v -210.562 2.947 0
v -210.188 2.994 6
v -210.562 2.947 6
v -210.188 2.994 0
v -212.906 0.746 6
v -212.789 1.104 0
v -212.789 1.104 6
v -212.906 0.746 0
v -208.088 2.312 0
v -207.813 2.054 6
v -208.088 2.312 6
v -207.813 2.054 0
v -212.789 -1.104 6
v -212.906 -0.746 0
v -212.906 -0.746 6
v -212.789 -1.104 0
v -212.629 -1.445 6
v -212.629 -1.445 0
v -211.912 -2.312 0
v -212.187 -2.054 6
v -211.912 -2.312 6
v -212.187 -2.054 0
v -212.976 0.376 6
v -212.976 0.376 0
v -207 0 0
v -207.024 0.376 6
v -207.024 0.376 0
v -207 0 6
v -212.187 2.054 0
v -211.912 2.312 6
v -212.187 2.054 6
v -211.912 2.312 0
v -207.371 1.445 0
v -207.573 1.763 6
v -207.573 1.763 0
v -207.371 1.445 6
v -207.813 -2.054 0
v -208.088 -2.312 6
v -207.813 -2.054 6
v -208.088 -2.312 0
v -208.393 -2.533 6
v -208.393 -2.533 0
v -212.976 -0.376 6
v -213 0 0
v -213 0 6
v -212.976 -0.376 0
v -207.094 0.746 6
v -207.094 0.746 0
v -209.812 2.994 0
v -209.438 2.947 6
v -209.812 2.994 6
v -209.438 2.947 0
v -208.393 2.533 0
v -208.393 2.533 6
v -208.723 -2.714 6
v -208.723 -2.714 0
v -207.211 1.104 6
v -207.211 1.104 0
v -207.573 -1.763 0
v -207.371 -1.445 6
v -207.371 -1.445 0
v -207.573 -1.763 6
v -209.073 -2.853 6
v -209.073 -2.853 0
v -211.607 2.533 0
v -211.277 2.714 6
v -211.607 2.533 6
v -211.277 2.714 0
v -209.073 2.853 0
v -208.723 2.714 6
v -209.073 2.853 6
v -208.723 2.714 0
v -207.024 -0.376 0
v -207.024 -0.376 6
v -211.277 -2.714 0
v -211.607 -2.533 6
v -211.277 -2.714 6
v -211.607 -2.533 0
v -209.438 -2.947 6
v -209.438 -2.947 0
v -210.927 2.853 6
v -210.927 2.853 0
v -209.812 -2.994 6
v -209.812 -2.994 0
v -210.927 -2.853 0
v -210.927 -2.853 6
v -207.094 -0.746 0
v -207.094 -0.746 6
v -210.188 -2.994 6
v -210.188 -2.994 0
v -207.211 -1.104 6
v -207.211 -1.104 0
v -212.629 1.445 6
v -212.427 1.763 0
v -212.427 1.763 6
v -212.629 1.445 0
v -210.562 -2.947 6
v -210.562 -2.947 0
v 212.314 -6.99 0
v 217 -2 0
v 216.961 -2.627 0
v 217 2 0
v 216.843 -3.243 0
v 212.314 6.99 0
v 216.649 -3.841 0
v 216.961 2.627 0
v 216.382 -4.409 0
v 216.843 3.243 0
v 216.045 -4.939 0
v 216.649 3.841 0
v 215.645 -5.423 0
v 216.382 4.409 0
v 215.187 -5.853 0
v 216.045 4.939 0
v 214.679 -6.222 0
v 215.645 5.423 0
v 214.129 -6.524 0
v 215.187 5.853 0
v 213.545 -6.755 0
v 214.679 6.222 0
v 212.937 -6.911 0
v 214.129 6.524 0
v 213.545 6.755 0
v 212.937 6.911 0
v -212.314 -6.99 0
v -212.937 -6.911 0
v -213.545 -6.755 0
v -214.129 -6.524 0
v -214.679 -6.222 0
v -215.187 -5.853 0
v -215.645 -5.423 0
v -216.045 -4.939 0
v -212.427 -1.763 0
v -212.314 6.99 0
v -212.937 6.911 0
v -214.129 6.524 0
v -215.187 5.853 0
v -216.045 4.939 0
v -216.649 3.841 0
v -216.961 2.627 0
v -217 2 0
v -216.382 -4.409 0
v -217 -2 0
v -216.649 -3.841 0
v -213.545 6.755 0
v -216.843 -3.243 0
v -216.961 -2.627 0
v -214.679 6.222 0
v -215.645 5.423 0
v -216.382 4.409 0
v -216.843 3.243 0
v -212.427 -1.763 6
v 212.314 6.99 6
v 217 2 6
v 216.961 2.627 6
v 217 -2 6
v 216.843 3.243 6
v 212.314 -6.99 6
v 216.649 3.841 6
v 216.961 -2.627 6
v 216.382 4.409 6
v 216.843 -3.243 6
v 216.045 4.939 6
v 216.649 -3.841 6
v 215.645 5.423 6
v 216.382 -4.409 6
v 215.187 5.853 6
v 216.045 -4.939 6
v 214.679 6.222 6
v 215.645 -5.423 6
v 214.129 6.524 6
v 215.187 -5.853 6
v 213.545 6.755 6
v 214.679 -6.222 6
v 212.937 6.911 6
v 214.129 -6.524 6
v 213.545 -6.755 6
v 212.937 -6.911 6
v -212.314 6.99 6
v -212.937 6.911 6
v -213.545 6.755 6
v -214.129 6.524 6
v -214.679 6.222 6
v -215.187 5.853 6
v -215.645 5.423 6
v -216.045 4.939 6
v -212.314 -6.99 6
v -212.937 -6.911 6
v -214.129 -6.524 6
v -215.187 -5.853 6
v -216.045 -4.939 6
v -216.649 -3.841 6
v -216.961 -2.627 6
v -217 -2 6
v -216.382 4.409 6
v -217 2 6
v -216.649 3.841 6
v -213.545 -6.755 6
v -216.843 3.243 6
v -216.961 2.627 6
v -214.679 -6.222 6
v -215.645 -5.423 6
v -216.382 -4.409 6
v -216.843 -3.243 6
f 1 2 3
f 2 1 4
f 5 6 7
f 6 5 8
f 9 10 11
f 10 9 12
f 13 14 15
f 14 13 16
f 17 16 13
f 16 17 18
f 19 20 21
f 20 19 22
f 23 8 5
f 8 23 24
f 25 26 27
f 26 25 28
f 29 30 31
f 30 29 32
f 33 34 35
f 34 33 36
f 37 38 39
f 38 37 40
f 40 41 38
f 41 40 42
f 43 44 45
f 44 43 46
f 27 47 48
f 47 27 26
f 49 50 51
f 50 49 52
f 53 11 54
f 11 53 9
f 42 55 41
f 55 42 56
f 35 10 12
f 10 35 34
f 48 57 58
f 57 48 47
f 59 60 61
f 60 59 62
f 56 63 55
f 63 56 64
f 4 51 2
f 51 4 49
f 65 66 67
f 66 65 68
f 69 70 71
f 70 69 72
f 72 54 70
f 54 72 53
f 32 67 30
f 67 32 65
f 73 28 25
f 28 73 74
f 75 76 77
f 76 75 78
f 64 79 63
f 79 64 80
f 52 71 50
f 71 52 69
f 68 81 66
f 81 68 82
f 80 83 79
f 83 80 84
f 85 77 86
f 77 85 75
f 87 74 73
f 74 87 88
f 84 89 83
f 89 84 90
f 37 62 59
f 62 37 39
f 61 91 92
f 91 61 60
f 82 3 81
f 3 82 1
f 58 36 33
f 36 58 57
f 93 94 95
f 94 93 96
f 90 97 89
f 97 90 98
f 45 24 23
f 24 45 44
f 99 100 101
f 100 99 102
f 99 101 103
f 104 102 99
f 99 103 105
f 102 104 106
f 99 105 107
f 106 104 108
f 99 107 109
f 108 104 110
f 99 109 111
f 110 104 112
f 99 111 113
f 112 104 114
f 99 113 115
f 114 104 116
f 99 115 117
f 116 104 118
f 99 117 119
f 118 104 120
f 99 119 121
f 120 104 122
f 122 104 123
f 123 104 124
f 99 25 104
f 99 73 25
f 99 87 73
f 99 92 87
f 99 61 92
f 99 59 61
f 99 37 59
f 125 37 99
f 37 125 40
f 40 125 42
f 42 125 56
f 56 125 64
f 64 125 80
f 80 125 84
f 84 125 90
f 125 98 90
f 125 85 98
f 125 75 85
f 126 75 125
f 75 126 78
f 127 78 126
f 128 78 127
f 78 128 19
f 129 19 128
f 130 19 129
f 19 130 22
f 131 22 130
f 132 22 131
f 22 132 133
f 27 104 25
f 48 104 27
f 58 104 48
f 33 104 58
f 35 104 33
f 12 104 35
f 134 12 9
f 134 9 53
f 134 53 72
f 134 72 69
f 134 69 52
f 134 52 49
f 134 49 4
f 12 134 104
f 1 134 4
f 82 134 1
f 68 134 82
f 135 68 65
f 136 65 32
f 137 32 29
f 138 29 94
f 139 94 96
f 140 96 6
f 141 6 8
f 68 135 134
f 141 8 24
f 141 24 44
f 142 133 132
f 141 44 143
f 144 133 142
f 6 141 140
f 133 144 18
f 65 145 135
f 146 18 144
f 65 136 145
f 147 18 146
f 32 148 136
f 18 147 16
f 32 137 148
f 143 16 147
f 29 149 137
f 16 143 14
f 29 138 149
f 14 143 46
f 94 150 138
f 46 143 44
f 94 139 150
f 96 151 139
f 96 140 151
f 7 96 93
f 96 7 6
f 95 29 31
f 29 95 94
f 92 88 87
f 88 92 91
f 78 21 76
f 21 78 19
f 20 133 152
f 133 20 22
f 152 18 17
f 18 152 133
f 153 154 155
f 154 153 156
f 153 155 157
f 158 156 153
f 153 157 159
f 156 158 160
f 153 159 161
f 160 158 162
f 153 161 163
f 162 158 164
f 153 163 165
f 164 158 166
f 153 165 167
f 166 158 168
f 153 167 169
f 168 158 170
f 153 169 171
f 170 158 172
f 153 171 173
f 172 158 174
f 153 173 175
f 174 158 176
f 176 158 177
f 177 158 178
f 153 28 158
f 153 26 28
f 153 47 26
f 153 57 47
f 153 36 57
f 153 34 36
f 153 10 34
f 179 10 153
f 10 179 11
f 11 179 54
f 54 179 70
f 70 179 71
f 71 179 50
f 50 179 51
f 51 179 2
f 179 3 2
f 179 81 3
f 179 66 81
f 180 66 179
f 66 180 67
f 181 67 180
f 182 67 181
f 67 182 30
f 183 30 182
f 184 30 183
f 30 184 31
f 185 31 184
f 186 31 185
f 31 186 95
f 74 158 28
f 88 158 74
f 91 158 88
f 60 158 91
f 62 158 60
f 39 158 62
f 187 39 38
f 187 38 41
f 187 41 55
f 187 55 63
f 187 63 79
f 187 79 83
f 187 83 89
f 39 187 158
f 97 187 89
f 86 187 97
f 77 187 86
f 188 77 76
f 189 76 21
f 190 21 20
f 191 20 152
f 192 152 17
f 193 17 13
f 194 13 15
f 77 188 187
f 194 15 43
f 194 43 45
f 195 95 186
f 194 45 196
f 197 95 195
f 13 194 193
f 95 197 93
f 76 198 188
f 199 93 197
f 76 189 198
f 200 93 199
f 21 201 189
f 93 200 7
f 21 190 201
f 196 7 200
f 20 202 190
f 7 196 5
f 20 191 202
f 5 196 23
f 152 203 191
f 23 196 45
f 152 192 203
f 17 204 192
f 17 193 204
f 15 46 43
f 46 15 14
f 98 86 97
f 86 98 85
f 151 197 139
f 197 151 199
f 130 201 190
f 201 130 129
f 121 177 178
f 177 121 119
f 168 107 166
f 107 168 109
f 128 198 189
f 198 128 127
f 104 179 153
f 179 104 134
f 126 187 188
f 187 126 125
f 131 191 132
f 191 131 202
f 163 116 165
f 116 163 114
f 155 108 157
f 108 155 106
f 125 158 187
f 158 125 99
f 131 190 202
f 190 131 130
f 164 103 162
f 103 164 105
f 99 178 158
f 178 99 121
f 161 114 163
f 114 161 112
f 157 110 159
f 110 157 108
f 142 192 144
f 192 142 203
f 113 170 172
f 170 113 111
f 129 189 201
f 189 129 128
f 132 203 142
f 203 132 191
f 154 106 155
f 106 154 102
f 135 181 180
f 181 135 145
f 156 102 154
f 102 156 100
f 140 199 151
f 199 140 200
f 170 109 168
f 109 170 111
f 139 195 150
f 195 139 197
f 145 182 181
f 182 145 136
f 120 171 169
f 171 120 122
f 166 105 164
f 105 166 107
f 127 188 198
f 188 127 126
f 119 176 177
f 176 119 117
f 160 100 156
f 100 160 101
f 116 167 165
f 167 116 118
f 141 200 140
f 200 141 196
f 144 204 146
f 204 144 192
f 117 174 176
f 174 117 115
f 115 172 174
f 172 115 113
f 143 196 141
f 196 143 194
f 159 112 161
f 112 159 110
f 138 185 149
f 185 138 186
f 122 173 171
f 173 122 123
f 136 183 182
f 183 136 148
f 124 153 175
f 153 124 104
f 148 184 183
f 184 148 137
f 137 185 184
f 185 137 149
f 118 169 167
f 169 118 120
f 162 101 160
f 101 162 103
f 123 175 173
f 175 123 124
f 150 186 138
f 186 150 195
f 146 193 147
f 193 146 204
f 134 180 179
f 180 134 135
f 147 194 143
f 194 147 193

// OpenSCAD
$fn = 50;


difference() {
	union() {
		hull() {
			translate(v = [-212.0000000000, 2.0000000000, 0]) {
				cylinder(h = 6, r = 5);
			}
			translate(v = [212.0000000000, 2.0000000000, 0]) {
				cylinder(h = 6, r = 5);
			}
			translate(v = [-212.0000000000, -2.0000000000, 0]) {
				cylinder(h = 6, r = 5);
			}
			translate(v = [212.0000000000, -2.0000000000, 0]) {
				cylinder(h = 6, r = 5);
			}
		}
	}
	union() {
		translate(v = [-210.0000000000, 0.0000000000, 0]) {
			cylinder(h = 6, r = 3.0000000000);
		}
		translate(v = [-210.0000000000, 0.0000000000, 0]) {
			cylinder(h = 6, r = 1.5000000000);
		}
		translate(v = [-210.0000000000, 0.0000000000, 0]) {
			cylinder(h = 6, r = 1.5000000000);
		}
		translate(v = [-210.0000000000, 0.0000000000, 0]) {
			cylinder(h = 6, r = 1.5000000000);
		}
	}
}
